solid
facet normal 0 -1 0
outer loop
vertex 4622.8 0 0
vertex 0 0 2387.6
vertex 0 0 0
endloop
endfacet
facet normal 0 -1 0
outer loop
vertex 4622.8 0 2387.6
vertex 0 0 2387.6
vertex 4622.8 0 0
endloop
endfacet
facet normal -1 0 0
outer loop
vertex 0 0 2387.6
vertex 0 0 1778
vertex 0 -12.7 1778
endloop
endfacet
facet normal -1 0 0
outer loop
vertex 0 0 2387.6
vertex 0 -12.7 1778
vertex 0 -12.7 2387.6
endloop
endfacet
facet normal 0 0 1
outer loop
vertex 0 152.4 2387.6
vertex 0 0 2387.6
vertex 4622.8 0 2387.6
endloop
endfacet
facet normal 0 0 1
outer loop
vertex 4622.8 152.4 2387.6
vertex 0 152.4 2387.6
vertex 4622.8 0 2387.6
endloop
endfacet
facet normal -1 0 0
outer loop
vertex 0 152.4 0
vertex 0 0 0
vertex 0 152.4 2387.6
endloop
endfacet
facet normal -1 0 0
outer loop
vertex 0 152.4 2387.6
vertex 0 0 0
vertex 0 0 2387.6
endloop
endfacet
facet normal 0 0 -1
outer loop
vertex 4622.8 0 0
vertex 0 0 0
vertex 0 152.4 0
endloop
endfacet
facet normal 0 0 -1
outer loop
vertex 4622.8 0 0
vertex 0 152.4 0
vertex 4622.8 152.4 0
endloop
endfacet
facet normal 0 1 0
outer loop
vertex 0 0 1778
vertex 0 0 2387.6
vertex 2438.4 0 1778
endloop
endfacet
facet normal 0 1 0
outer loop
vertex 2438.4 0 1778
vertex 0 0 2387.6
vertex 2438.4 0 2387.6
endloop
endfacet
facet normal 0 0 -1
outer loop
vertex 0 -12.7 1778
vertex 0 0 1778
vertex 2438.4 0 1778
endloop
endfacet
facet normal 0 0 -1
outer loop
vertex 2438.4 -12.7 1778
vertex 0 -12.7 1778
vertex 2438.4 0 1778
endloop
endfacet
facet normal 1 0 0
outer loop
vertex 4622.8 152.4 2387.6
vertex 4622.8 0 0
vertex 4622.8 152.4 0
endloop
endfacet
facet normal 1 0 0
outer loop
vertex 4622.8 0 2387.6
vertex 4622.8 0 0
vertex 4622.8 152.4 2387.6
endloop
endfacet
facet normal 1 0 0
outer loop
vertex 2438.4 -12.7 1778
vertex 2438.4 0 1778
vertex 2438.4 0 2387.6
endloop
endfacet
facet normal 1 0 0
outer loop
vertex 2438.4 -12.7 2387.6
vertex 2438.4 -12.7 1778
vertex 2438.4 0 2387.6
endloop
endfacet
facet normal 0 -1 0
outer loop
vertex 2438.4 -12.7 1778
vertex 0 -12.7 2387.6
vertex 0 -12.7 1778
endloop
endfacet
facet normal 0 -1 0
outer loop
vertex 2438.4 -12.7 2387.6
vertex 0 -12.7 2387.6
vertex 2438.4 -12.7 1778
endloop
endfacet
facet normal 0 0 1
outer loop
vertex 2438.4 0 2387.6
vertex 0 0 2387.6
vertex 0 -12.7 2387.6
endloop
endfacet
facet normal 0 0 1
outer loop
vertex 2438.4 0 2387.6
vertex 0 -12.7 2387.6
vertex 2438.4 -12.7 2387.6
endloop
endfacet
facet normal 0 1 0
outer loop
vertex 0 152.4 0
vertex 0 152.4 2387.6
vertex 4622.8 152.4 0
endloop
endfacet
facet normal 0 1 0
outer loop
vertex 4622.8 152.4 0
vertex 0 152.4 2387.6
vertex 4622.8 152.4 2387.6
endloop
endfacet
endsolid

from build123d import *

# Parameters (mm, degrees)
F0_W     = 4622.8
F0_H     = 2387.6
F1_DEPTH = 152.4
F2_W     = 2438.4
F2_H     = 609.6
F3_DEPTH = 12.7


with BuildPart() as f1:
    # F0 (on Front) → F1 (new body)
    with BuildSketch(Plane.XZ):
        with Locations((2311.4, 1193.8)):
            Rectangle(F0_W, F0_H)
    extrude(amount=-F1_DEPTH)


with BuildPart() as f3:
    # F2 (on face) → F3 (new body)
    with BuildSketch(Plane.XZ):
        with Locations((1219.2, 2082.8)):
            Rectangle(F2_W, F2_H)
    extrude(amount=F3_DEPTH)


solid = Compound([f1.part, f3.part])
